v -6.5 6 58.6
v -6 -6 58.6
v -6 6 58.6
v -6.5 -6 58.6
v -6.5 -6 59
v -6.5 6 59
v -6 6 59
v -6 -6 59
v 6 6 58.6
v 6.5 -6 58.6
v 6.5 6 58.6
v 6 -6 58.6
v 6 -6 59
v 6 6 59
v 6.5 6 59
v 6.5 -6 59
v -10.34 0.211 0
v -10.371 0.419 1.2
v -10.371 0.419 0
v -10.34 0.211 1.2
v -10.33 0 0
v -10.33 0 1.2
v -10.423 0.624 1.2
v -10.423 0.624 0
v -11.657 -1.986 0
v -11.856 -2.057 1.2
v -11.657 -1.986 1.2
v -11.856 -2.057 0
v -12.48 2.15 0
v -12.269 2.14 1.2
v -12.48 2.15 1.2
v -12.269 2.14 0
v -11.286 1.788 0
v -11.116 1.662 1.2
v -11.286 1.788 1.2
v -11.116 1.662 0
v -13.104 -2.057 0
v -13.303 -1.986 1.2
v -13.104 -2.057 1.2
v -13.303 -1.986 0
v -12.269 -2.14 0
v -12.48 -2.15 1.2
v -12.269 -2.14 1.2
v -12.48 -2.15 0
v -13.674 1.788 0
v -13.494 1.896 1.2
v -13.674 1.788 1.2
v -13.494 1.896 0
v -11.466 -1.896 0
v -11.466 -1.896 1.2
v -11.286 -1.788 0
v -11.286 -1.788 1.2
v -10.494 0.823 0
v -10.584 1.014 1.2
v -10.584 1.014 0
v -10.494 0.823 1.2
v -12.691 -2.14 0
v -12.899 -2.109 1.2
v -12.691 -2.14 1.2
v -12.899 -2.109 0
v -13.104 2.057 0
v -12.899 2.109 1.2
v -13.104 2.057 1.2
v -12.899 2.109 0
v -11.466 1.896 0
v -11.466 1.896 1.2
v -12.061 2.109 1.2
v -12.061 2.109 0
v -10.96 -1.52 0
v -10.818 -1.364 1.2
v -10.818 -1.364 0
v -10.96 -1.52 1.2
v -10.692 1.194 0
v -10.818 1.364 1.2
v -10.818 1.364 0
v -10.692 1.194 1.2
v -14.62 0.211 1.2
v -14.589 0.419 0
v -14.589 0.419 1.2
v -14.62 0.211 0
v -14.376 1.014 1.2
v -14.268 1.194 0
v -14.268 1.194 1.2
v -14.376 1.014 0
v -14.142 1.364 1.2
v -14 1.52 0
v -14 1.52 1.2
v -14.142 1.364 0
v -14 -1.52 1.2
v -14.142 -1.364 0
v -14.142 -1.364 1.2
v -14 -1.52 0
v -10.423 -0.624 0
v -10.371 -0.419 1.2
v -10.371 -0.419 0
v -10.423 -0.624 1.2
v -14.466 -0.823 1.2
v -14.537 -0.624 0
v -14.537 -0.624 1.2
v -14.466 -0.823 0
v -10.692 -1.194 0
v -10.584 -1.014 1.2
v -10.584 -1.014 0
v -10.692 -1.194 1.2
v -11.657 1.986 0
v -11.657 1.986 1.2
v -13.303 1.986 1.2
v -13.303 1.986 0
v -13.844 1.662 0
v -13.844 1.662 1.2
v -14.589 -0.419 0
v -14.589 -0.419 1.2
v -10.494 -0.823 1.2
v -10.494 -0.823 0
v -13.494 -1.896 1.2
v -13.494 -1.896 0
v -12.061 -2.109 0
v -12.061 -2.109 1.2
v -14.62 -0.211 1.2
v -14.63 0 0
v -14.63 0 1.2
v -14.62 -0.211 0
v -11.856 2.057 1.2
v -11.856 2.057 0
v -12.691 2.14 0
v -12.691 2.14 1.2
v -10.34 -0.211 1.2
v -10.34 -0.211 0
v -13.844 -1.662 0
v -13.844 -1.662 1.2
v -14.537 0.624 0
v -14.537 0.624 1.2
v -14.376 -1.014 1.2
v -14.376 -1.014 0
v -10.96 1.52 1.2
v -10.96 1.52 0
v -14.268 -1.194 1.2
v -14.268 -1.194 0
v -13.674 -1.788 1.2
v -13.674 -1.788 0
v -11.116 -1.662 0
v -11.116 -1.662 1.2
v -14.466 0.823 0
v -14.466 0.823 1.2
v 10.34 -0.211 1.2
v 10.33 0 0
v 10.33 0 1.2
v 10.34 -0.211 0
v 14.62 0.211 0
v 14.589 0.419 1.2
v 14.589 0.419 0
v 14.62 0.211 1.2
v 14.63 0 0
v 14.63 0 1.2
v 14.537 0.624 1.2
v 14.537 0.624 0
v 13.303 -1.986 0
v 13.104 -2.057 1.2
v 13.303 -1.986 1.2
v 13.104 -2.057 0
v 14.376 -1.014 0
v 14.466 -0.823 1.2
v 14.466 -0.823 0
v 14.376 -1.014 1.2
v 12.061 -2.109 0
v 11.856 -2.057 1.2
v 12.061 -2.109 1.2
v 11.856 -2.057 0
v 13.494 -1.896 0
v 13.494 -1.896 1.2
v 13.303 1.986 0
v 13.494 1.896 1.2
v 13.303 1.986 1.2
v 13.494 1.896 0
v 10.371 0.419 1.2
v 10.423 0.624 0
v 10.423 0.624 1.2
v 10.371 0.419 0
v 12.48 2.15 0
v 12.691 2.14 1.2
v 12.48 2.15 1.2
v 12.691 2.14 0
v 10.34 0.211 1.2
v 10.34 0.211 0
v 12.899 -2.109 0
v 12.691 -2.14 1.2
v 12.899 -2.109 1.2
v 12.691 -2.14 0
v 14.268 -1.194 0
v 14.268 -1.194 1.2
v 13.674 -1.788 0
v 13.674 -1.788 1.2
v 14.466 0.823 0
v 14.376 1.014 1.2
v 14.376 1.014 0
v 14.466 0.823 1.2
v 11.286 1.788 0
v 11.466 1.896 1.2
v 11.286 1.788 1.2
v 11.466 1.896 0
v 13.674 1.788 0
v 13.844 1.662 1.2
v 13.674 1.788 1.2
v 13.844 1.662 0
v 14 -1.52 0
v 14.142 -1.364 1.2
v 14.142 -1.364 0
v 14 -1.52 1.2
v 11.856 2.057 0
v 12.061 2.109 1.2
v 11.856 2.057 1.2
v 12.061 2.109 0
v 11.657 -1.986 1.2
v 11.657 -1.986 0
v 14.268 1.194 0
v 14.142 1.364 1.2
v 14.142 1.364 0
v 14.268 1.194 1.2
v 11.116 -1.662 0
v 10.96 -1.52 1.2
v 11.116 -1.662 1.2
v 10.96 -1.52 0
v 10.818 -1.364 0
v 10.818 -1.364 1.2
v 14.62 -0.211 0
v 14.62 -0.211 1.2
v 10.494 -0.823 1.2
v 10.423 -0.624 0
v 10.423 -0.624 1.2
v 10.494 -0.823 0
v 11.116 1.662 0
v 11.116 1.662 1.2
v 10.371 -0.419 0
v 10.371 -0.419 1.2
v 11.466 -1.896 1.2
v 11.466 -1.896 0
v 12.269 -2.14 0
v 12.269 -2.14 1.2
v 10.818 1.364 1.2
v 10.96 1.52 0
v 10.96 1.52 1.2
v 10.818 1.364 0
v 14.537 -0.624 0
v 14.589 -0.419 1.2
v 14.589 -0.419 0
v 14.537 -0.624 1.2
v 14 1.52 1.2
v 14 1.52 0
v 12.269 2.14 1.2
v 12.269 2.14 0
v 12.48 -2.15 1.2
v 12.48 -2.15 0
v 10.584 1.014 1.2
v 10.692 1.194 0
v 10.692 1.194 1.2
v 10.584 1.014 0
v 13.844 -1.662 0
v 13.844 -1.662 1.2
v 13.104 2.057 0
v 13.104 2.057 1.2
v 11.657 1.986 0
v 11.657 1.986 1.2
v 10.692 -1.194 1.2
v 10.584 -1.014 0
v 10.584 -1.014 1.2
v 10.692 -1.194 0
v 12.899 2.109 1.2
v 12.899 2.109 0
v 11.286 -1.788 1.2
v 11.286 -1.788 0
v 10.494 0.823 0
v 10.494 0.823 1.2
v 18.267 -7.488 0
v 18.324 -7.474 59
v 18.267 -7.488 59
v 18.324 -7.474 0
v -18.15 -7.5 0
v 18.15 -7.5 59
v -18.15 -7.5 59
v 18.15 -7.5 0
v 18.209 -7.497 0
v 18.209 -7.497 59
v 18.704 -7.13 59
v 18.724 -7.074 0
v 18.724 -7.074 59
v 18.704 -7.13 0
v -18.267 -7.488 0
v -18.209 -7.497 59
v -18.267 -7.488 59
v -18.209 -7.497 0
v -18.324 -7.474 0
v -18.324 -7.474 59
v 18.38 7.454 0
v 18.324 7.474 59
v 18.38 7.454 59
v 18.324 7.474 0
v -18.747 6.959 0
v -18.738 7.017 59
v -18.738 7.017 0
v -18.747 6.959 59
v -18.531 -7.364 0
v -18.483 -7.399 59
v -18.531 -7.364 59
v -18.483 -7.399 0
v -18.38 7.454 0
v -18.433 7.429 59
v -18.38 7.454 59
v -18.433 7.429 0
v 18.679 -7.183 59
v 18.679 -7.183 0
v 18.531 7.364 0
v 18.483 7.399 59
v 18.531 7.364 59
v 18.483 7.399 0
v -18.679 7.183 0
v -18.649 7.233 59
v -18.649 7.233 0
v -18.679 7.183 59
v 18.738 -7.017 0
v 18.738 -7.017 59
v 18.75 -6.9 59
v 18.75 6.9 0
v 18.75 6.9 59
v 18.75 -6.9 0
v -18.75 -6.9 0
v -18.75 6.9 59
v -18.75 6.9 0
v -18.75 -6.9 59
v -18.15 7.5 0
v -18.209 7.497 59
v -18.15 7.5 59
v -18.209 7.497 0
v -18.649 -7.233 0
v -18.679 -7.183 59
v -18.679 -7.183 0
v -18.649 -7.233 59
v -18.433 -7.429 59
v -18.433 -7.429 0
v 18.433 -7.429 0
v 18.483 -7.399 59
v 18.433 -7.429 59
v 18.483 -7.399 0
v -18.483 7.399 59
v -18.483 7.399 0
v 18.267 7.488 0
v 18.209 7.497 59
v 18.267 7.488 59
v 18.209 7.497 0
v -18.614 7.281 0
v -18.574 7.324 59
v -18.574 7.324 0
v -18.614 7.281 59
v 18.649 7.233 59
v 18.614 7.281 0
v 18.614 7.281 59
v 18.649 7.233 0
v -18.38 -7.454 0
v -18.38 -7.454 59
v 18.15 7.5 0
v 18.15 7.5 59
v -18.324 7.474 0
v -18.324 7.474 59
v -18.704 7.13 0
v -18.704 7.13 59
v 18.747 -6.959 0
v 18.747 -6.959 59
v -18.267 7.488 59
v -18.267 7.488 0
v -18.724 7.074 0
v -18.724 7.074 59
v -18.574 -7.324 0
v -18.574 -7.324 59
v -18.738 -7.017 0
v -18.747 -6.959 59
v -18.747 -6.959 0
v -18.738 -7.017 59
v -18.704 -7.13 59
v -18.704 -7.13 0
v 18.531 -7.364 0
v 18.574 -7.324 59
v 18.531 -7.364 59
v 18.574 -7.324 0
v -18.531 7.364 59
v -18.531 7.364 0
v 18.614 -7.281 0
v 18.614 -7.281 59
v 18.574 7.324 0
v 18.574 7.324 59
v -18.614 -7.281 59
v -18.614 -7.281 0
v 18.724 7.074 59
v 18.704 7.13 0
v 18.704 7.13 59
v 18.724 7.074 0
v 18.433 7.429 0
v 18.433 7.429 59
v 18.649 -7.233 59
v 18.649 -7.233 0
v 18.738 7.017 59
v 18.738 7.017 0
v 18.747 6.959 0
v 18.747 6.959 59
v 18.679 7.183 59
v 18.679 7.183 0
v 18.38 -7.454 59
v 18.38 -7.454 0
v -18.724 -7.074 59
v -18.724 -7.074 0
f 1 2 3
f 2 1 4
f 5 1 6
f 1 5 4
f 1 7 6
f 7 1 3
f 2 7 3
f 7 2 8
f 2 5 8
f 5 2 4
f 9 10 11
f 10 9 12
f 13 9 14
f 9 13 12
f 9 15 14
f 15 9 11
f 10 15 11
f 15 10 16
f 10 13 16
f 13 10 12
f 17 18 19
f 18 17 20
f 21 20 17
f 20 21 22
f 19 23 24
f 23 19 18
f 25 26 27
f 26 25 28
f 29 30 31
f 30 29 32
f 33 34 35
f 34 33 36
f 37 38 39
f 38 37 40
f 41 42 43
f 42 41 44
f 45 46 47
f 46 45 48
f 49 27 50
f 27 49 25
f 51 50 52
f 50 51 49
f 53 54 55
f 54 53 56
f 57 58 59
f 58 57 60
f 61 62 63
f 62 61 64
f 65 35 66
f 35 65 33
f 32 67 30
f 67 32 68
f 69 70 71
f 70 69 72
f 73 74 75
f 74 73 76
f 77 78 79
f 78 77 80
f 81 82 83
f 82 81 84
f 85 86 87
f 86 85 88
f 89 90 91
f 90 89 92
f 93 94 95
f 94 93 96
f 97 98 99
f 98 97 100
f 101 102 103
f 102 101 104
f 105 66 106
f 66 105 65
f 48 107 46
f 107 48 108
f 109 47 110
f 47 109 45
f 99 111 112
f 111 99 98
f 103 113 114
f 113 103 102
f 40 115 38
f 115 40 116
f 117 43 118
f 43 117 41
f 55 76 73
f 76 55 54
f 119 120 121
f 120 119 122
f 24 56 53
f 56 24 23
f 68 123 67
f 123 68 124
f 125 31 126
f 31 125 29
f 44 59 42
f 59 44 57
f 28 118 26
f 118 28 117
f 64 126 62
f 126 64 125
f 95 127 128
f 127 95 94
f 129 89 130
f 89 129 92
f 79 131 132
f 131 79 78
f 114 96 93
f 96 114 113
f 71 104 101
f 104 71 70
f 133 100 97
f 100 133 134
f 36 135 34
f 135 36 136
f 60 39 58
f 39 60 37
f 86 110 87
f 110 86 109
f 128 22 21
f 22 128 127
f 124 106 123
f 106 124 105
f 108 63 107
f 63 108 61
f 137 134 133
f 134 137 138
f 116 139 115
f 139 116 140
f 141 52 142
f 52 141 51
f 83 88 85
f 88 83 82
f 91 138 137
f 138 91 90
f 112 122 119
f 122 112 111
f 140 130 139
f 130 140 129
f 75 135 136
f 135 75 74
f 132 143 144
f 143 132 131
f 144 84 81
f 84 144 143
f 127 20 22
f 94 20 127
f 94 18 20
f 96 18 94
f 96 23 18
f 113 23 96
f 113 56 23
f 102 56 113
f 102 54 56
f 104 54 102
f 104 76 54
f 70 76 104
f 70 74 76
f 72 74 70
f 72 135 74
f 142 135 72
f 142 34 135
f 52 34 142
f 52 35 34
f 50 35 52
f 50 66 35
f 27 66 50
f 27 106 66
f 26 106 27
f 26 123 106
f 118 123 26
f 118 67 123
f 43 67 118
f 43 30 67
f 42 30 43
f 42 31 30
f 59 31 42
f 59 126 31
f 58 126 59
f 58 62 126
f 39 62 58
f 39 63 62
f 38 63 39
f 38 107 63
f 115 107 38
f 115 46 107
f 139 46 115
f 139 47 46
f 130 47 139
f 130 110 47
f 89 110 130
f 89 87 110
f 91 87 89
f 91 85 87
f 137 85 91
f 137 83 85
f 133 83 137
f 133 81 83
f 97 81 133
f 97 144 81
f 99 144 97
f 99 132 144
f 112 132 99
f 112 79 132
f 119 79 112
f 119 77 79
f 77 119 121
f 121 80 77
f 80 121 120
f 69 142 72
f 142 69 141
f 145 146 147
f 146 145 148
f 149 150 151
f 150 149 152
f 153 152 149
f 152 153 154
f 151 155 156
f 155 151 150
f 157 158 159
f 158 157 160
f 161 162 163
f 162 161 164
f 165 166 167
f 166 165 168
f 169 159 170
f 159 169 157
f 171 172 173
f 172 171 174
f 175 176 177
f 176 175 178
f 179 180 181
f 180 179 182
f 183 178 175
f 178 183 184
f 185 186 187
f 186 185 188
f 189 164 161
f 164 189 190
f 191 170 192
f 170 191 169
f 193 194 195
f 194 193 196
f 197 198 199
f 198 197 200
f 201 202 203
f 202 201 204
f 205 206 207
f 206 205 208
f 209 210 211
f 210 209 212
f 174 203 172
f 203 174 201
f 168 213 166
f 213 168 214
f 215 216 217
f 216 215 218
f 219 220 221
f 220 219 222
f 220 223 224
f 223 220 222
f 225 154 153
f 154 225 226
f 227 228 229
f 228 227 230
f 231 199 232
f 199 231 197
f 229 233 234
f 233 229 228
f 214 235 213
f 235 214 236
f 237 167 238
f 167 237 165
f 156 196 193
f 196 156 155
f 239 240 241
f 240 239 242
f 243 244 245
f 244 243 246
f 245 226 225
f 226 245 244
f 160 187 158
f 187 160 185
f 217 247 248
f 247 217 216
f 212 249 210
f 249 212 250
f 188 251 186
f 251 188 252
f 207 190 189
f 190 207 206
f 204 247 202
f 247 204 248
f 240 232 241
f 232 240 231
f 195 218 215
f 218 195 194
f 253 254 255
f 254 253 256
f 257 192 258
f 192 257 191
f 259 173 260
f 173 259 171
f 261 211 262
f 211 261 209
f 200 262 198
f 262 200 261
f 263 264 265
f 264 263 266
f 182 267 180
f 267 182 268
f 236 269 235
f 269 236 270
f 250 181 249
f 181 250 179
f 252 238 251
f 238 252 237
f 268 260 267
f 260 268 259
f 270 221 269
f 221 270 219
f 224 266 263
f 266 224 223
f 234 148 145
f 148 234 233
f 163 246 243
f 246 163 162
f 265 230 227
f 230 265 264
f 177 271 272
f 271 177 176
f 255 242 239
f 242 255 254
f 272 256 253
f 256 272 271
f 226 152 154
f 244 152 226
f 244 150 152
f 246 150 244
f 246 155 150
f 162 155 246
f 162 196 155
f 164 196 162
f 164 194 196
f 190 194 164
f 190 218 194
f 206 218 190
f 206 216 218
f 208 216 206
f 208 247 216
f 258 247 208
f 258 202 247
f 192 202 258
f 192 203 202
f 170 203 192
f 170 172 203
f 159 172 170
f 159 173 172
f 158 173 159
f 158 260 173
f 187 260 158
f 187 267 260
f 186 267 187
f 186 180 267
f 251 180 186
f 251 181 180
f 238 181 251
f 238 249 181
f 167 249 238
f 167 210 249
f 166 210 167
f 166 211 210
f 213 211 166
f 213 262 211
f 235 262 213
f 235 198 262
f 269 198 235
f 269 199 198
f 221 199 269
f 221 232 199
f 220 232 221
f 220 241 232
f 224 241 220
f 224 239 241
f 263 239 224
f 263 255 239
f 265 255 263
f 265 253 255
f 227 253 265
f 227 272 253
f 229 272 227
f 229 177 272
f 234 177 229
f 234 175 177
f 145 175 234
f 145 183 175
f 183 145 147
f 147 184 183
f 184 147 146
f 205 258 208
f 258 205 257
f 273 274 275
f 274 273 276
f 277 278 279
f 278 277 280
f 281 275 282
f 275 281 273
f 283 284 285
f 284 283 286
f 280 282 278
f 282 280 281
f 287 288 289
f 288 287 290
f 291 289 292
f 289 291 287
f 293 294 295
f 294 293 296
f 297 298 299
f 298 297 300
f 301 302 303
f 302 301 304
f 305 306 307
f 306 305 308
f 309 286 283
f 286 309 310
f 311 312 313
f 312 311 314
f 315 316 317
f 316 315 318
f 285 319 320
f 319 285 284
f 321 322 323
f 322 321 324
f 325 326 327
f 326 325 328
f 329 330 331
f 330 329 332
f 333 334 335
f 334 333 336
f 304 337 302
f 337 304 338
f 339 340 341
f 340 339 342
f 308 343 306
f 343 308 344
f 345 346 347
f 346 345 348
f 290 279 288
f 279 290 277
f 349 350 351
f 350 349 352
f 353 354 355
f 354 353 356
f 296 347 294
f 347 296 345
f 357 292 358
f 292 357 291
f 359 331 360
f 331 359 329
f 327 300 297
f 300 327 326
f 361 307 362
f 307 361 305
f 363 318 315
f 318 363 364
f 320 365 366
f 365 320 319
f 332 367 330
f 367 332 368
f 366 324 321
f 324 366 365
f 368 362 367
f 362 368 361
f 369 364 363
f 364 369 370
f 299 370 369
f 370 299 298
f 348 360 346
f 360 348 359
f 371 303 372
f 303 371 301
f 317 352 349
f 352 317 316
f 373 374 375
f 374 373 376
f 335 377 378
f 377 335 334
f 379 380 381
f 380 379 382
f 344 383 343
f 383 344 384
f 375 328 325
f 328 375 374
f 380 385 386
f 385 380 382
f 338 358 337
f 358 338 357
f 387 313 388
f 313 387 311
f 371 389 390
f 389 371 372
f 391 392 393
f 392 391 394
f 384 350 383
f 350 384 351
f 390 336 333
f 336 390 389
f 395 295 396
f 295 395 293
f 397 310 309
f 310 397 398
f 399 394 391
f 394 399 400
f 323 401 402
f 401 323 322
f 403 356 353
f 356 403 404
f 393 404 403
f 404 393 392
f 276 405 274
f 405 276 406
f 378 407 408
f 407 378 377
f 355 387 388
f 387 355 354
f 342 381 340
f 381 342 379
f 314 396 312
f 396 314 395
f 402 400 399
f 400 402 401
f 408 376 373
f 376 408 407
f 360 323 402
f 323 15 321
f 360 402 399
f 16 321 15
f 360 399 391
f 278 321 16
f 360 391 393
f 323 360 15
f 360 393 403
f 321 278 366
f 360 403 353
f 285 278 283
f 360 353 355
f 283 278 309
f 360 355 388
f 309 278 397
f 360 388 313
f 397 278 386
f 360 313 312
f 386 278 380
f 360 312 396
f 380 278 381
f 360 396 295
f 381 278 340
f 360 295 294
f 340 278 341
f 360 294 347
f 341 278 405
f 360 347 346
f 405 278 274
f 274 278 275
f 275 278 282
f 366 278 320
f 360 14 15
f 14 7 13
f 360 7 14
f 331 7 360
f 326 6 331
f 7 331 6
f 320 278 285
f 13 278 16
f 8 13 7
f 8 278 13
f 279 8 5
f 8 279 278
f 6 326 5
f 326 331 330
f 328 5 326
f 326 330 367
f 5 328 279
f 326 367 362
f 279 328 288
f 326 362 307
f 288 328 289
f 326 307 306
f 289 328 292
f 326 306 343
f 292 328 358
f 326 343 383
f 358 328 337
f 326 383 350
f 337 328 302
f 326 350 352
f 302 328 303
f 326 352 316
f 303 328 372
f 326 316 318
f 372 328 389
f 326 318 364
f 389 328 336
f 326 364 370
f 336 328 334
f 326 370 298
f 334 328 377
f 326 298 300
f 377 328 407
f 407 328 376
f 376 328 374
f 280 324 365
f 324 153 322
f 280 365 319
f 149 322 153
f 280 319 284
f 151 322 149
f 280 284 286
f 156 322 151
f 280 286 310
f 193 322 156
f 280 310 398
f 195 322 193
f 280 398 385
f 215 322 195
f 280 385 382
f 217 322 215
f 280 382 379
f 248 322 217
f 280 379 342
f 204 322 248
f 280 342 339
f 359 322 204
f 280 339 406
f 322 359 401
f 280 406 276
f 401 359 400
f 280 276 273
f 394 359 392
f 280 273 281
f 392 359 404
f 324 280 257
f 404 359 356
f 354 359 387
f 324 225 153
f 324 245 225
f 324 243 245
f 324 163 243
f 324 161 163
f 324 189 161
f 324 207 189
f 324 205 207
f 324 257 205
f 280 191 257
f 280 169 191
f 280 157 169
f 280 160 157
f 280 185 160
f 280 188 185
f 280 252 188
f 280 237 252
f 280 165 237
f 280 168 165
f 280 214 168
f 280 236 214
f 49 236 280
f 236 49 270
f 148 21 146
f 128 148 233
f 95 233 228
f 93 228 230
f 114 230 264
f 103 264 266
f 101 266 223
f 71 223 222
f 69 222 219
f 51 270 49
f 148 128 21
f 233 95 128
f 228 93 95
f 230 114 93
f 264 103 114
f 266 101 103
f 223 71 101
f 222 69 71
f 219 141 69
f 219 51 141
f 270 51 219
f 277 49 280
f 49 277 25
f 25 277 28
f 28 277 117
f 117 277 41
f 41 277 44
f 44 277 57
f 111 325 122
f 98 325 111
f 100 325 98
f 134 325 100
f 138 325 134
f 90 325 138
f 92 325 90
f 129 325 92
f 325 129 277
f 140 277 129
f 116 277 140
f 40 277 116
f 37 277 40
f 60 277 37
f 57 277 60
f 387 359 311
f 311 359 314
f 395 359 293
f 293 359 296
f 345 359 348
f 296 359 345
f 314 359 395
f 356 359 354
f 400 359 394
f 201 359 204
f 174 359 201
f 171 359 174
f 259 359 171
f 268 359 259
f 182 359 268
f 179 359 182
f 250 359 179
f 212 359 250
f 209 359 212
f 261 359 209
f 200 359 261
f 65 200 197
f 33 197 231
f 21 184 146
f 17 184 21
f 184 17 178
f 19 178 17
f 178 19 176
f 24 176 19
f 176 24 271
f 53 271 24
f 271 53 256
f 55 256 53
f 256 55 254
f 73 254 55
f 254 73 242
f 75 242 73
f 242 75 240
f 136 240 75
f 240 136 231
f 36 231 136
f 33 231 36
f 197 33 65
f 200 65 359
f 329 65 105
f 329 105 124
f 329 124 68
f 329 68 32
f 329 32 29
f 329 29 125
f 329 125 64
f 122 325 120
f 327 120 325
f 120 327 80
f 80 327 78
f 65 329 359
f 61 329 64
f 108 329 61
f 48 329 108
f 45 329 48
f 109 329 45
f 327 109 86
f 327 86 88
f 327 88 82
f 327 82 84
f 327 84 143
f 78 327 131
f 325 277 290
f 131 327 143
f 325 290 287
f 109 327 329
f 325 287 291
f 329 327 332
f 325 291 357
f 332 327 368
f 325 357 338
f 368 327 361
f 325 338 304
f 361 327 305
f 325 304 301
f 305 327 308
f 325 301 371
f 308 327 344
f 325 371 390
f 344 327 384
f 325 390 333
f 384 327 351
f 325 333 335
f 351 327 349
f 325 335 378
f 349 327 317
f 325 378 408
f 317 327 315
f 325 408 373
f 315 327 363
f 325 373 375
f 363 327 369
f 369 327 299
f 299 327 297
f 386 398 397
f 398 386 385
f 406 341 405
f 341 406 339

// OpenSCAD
// bedroom / wardrobe — a standalone sliding-door wardrobe token, with vertical
// door-seam grooves engraved on top and nothing else.
//
// Width/Depth are the real-world footprint in cm: freestanding sliding
// wardrobes run anywhere from a narrow 100 cm up to a 200 cm wide run, 60 cm
// deep. Height is the real carcass height — a full-height sliding wardrobe, the
// same 236 cm as a tall PAX frame — shrunk by the plan scale like the footprint
// (see printed_h() in lib/common.scad), so it is one of the tallest pieces of the
// set; the door seams (not a hanger) are what tell it apart from a PAX.

include <../lib/common.scad>

Width  = 150;  // cm (100..200)
Depth  = 60;   // cm
Height = 236;  // cm — full-height carcass

// the printed height, mm: Height at the plan scale
Print_h = printed_h(Height);

Show_doors = true;
// Door seams: vertical grooves cut into the top face, splitting the front into
// sliding doors — two seams (3 doors) up to Seam3_from cm wide, a third seam
// (4 doors) beyond that, so no single door panel reads unrealistically wide.
Seam3_from    = 170;  // cm
Door_groove_w = 2;    // cm — real-world seam width (0.5 mm printed at 1:40)
Door_margin   = 6;    // cm kept clear at the front/back edge of every groove
// Magnet pockets in the bottom face, in a row along the width (0 = none). Two
// keep the piece from pivoting; see Magnet_* in lib/common.scad.
Magnets = 2;

wardrobe();

module wardrobe() {
    seams = Width >= Seam3_from ? 3 : 2;
    doors = seams + 1;
    difference() {
        footprint(Width, Depth, Print_h);
        // seams split the front into sliding doors — unlike PAX's hanger,
        // nothing here reads as "a single hinged frame"
        if (Show_doors)
            for (i = [1 : seams])
                groove(-Width / 2 + i * Width / doors, 0,
                       Door_groove_w, Depth - 2 * Door_margin, Print_h);
        if (Magnets > 0)
            magnets(Width, Depth, Magnets);
    }
}
